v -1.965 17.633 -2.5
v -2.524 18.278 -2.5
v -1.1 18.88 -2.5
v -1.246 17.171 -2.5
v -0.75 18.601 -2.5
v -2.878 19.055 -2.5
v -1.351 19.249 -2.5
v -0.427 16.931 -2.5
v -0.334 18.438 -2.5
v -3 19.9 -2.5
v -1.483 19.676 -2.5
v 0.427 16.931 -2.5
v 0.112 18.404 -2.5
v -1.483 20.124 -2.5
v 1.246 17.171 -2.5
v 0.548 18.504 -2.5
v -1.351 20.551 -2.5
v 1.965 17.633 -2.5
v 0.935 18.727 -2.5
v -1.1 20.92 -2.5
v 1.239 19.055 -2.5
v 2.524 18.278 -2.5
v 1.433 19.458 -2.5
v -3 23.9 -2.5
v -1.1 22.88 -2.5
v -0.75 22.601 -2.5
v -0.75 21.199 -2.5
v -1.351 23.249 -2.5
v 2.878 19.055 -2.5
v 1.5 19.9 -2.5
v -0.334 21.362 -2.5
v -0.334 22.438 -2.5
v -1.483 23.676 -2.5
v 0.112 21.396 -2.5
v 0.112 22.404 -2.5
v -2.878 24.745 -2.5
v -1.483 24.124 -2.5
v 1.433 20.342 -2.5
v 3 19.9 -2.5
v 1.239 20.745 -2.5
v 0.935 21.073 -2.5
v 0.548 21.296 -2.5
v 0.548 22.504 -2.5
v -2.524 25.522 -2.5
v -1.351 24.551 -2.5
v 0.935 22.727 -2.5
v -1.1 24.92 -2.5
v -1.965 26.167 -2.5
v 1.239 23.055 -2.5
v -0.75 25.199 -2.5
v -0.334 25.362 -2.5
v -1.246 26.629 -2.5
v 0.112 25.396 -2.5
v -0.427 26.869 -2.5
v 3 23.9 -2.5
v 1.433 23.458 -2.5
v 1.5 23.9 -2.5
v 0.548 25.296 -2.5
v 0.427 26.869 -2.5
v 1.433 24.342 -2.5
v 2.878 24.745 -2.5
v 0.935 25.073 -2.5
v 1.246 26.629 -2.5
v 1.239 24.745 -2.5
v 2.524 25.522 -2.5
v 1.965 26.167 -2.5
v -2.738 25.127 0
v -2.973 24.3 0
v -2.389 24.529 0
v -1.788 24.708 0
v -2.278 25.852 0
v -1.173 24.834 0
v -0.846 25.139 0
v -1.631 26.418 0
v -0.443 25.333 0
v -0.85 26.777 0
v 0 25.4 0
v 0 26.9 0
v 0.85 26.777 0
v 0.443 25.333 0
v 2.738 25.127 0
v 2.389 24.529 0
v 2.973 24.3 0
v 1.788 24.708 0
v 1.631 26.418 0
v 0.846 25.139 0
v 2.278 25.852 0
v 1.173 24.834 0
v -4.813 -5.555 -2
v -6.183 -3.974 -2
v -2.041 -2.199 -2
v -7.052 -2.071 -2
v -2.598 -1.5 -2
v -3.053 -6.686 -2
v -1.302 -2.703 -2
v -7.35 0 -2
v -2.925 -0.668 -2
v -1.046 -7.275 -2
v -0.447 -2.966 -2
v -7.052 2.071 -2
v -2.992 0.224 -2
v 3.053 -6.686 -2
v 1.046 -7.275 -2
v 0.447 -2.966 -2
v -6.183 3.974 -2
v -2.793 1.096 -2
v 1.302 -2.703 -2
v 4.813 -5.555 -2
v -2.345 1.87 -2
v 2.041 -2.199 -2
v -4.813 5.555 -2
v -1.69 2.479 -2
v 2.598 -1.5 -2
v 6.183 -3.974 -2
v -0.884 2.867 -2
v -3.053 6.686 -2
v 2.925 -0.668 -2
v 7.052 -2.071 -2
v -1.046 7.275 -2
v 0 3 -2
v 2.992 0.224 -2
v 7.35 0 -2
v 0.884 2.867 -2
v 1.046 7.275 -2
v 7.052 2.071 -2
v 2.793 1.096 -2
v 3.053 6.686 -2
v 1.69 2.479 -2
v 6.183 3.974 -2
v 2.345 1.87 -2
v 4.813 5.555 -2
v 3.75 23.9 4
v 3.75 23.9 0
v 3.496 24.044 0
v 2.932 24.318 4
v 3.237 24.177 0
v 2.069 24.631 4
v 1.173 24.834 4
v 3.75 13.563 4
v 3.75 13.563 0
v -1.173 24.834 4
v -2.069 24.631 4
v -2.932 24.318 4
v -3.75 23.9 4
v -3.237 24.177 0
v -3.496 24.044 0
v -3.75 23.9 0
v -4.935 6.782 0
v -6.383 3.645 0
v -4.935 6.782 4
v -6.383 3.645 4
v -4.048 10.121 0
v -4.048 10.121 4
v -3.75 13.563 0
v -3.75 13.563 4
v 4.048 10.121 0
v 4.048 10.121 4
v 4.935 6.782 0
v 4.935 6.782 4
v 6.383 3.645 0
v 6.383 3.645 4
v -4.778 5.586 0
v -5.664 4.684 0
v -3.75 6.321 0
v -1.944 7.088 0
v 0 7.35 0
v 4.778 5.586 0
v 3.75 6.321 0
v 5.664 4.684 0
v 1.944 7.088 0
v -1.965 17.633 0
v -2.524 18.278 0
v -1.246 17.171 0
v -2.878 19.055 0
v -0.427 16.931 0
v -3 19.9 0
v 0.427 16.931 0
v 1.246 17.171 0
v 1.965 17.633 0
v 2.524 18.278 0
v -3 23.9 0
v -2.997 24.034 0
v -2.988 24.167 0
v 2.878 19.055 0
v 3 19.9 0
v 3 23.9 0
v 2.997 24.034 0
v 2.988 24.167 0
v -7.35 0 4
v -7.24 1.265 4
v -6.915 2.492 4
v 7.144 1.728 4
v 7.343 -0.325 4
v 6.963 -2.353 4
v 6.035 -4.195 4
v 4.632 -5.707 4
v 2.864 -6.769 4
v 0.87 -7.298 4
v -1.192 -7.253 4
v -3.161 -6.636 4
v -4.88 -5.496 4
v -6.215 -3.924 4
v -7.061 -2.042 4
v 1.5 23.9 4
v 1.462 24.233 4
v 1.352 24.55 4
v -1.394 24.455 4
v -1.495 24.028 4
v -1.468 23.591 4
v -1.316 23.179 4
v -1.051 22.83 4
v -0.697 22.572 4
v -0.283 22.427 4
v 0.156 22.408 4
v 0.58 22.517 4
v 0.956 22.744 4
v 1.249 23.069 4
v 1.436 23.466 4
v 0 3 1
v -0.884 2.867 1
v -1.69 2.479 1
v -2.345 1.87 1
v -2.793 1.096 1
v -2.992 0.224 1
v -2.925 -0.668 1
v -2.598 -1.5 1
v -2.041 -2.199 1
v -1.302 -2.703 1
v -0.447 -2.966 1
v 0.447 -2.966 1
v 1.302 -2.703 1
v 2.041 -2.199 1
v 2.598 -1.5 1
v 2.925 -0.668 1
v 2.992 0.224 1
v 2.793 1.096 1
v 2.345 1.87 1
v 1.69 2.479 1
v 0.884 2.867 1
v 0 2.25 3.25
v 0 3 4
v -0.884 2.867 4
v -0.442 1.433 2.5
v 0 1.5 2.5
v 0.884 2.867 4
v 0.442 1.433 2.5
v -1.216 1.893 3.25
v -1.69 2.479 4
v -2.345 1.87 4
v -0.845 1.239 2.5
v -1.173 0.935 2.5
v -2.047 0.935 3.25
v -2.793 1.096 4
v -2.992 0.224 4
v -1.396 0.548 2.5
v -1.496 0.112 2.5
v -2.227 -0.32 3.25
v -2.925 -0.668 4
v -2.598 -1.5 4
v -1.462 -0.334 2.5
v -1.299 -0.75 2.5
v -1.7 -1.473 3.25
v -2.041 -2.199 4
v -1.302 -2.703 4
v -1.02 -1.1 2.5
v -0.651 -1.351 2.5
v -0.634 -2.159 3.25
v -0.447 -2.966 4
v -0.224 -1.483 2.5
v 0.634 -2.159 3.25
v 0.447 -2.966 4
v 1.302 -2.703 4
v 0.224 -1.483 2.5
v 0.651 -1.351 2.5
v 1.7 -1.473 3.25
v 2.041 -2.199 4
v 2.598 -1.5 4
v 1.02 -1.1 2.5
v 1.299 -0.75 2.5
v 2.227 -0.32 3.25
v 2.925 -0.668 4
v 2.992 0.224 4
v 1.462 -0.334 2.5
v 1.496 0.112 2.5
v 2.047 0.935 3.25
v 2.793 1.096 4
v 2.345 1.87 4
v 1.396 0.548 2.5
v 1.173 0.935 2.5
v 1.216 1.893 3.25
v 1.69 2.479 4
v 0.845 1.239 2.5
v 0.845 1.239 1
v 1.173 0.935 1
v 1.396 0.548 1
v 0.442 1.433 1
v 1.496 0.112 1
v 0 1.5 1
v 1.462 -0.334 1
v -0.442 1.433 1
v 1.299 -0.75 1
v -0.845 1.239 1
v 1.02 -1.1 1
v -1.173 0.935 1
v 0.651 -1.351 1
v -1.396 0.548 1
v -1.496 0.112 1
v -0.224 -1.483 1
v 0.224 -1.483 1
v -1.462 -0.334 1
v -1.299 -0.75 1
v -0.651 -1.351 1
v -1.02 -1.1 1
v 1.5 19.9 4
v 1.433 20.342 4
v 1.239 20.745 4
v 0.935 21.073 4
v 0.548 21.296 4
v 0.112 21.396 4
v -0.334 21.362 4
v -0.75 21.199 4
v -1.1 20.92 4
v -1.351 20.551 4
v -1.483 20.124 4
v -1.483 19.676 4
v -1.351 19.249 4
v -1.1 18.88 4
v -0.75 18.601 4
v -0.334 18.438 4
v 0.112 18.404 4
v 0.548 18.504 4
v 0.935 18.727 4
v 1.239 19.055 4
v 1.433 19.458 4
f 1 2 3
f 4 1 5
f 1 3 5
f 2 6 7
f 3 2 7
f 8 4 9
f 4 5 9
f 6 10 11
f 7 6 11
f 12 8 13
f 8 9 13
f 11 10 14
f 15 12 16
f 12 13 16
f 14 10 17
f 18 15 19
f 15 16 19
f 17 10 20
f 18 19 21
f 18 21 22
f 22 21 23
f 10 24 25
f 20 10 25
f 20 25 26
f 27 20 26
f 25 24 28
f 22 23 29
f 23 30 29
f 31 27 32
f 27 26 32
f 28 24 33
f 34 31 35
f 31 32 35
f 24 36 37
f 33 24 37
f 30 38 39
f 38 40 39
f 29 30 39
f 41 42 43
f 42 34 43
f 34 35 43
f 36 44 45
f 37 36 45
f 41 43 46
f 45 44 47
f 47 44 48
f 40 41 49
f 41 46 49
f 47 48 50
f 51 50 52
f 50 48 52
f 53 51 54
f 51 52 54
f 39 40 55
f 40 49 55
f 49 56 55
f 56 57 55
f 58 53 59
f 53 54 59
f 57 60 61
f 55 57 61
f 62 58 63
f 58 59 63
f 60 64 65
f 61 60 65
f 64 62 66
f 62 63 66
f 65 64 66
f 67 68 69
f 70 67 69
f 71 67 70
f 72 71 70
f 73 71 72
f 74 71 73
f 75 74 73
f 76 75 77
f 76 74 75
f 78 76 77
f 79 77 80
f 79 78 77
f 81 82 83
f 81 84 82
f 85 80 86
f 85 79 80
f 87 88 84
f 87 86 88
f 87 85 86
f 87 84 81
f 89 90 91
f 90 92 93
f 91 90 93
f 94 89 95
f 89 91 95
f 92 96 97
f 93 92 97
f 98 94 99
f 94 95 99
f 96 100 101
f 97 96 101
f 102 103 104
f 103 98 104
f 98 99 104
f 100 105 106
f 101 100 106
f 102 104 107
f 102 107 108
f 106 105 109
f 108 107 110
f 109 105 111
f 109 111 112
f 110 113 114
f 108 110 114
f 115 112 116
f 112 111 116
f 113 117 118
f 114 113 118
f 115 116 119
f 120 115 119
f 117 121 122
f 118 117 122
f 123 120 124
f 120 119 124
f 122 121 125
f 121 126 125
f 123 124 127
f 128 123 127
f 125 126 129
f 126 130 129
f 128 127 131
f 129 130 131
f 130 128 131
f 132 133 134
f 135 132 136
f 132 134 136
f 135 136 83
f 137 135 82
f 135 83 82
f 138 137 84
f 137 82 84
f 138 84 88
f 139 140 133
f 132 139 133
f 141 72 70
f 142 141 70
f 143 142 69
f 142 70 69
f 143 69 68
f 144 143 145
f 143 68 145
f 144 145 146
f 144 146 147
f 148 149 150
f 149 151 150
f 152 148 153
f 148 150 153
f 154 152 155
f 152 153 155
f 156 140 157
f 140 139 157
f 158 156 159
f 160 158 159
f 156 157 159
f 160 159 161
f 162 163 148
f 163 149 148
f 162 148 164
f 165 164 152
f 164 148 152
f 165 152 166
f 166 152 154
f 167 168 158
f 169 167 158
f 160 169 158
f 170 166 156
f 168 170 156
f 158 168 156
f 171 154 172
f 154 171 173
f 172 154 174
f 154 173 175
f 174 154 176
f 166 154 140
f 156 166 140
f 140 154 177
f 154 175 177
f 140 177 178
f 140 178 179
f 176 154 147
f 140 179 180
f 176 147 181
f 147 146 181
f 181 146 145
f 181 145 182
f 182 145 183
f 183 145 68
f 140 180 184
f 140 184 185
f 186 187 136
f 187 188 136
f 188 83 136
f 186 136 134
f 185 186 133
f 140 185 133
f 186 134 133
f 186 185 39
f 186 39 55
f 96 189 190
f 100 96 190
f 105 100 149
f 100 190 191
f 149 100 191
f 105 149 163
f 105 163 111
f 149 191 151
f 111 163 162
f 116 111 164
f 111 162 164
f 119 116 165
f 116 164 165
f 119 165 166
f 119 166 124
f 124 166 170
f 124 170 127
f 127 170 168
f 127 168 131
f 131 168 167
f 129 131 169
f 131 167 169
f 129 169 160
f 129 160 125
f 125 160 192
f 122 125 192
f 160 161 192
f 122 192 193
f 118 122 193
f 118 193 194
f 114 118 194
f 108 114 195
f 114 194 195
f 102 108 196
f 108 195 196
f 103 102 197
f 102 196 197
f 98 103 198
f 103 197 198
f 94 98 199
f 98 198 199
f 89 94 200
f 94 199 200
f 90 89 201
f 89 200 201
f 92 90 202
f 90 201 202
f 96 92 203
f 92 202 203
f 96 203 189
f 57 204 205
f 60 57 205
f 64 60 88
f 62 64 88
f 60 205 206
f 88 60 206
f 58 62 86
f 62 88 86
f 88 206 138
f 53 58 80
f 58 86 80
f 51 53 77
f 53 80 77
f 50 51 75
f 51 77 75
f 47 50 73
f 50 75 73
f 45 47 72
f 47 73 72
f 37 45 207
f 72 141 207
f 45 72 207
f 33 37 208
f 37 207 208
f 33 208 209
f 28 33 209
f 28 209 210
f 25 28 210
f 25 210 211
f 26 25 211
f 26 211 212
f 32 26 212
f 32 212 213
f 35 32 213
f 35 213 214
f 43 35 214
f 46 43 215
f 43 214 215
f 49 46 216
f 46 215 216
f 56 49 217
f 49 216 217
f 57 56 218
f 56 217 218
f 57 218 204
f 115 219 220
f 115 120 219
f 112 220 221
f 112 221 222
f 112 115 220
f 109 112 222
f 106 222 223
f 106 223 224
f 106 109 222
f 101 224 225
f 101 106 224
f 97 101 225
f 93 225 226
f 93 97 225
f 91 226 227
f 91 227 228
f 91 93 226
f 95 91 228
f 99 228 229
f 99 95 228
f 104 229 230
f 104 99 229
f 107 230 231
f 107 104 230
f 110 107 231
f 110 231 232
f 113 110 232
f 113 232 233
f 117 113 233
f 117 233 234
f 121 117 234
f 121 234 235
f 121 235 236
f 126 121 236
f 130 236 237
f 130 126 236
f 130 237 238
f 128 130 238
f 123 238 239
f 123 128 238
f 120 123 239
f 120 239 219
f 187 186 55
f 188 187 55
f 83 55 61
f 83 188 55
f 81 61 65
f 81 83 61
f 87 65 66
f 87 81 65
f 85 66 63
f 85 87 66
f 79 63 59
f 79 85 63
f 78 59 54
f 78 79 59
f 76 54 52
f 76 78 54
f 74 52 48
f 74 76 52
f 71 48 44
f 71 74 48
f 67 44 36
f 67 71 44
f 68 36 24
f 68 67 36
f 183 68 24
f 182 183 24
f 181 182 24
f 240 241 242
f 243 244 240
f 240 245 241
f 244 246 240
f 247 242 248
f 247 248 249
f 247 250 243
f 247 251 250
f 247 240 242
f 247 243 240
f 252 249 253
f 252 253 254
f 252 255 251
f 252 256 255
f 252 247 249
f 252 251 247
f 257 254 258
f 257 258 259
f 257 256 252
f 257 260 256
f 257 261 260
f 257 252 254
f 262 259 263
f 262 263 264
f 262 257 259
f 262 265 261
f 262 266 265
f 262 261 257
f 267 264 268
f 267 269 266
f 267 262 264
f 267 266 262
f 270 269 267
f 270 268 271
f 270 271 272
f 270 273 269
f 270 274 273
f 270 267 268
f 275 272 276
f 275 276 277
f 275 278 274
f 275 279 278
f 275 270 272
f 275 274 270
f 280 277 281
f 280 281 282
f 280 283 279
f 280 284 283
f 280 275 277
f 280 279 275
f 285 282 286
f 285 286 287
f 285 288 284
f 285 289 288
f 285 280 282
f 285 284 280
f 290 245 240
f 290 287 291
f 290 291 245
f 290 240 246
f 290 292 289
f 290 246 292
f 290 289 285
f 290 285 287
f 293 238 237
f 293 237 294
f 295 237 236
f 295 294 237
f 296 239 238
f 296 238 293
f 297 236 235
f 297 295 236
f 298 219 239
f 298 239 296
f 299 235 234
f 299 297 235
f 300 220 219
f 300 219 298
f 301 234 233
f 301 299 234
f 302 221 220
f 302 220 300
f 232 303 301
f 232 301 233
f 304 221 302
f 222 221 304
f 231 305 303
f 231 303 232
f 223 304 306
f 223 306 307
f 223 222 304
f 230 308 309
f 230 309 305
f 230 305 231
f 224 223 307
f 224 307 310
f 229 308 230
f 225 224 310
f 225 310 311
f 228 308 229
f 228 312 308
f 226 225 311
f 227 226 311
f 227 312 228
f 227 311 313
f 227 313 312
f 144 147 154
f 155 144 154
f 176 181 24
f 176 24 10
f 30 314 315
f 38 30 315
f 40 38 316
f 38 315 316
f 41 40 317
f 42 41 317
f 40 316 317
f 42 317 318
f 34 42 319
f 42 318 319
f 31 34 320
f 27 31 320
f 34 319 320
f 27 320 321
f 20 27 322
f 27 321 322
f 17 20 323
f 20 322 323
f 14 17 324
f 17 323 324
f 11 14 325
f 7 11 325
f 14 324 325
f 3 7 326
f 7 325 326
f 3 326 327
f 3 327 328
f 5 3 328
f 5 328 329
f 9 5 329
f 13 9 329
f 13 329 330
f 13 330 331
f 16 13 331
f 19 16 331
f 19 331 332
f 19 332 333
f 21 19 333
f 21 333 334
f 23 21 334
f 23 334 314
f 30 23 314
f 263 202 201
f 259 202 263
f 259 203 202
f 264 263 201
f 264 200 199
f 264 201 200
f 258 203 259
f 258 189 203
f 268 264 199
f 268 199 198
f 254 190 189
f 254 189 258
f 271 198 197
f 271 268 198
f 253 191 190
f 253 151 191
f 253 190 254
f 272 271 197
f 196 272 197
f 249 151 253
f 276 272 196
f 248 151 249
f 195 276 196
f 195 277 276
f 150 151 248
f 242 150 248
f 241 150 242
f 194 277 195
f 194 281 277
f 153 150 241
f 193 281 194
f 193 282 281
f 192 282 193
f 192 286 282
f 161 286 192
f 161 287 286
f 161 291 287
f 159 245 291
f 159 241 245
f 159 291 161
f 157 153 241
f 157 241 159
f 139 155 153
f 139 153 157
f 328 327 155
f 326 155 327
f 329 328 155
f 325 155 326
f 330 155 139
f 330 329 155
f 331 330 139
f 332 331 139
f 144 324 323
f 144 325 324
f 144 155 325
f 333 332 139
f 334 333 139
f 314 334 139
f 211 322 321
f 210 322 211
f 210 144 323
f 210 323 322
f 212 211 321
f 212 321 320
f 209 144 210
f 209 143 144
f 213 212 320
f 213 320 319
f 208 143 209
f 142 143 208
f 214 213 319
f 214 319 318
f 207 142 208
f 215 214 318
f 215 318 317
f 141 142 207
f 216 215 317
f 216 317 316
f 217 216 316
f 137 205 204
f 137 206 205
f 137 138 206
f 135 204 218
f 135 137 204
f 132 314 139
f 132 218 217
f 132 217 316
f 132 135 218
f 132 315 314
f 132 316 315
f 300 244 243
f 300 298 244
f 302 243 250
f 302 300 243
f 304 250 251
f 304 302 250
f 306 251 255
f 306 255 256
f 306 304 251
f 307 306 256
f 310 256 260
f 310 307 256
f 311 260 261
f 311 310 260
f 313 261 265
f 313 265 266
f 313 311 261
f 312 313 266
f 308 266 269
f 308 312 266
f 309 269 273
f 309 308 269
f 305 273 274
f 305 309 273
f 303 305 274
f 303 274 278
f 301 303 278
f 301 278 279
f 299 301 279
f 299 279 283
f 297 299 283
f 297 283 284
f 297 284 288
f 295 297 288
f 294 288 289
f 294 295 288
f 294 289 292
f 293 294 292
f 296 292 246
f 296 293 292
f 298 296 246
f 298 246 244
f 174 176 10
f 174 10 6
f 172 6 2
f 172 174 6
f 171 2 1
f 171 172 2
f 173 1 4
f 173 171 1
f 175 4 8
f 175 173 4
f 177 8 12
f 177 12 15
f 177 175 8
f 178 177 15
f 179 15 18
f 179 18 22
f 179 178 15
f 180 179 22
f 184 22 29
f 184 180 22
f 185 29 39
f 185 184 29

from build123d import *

# Parameters (mm, degrees)
SKETCH1_W                = 7.35
SKETCH1_H                = 6
BOSS_EXTRUDE1_DEPTH      = 4
BOSS_EXTRUDE2_DEPTH      = 2.5
F_3_0_3_DIAMETER_HOLE1_D = 3
FILLET1_R                = 20


# Read off the part's stored shape, not the designer's step: Boss-Extrude1
with BuildPart() as part:
    # Sketch1 → Revolve1 (revolve)
    with BuildSketch(Plane.XZ, mode=Mode.PRIVATE) as revolve1_sk:
        with Locations((3.675, 1)):
            Rectangle(SKETCH1_W, SKETCH1_H)
    revolve(revolve1_sk.sketch.rotate(Axis((0, 0, 4), (0, 0, -1)), 180), axis=Axis((0, 0, 4), (0, 0, -1)))

    # Boss-Extrude1 outline → Boss-Extrude1 (add)
    with BuildSketch(Plane.XY):
        with BuildLine():
            ThreePointArc((3.75, 23.9), (0, 24.928607748), (-3.75, 23.9))
            Line((-3.75, 23.9), (-3.75, 6.321392252))
            ThreePointArc((-3.75, 6.321392252), (0, 7.35), (3.75, 6.321392252))
            Line((3.75, 6.321392252), (3.75, 23.9))
        make_face()
    extrude(amount=BOSS_EXTRUDE1_DEPTH)

    # Sketch3 → Boss-Extrude2 (add)
    with BuildSketch(Plane(origin=(0, 0, 0), x_dir=(-1, 0, 0), z_dir=(0, 0, -1))):
        with BuildLine():
            Line((3, 23.9), (3, 19.9))
            ThreePointArc((3, 19.9), (0, 16.9), (-3, 19.9))
            Line((-3, 19.9), (-3, 23.9))
            ThreePointArc((-3, 23.9), (0, 26.9), (3, 23.9))
        make_face()
    extrude(amount=BOSS_EXTRUDE2_DEPTH)

    # Ø3.0 (3) Diameter Hole1 (through all)
    with Locations(Plane(origin=(0, 0, -2.5), x_dir=(-1, 0, 0), z_dir=(0, 0, -1))):
        with Locations((0, 23.9), (0, 19.9)):
            Hole(F_3_0_3_DIAMETER_HOLE1_D / 2)

    # Sketch6 → CBORE for M2.5 Hex Head Machine Screw1 (revolve, cut)
    with BuildSketch(Plane(origin=(0, 0, -2), x_dir=(0, 1, 0), z_dir=(1, 0, 0))):
        Polygon((0, 0), (0, 6), (3, 6), (1.5, 4.5), (1.5, 3), (3, 3), (3, 0), align=None)
    revolve(axis=Axis((0, 0, -8.35), (0, 0, 1)), mode=Mode.SUBTRACT)

    # Fillet1
    fillet1_edges = [part.edges().sort_by_distance(p)[0] for p in [
        (-3.75, 6.321392252, 2),
        (3.75, 6.321392252, 2),
    ]]
    fillet(fillet1_edges, radius=FILLET1_R)


solid = part.part
